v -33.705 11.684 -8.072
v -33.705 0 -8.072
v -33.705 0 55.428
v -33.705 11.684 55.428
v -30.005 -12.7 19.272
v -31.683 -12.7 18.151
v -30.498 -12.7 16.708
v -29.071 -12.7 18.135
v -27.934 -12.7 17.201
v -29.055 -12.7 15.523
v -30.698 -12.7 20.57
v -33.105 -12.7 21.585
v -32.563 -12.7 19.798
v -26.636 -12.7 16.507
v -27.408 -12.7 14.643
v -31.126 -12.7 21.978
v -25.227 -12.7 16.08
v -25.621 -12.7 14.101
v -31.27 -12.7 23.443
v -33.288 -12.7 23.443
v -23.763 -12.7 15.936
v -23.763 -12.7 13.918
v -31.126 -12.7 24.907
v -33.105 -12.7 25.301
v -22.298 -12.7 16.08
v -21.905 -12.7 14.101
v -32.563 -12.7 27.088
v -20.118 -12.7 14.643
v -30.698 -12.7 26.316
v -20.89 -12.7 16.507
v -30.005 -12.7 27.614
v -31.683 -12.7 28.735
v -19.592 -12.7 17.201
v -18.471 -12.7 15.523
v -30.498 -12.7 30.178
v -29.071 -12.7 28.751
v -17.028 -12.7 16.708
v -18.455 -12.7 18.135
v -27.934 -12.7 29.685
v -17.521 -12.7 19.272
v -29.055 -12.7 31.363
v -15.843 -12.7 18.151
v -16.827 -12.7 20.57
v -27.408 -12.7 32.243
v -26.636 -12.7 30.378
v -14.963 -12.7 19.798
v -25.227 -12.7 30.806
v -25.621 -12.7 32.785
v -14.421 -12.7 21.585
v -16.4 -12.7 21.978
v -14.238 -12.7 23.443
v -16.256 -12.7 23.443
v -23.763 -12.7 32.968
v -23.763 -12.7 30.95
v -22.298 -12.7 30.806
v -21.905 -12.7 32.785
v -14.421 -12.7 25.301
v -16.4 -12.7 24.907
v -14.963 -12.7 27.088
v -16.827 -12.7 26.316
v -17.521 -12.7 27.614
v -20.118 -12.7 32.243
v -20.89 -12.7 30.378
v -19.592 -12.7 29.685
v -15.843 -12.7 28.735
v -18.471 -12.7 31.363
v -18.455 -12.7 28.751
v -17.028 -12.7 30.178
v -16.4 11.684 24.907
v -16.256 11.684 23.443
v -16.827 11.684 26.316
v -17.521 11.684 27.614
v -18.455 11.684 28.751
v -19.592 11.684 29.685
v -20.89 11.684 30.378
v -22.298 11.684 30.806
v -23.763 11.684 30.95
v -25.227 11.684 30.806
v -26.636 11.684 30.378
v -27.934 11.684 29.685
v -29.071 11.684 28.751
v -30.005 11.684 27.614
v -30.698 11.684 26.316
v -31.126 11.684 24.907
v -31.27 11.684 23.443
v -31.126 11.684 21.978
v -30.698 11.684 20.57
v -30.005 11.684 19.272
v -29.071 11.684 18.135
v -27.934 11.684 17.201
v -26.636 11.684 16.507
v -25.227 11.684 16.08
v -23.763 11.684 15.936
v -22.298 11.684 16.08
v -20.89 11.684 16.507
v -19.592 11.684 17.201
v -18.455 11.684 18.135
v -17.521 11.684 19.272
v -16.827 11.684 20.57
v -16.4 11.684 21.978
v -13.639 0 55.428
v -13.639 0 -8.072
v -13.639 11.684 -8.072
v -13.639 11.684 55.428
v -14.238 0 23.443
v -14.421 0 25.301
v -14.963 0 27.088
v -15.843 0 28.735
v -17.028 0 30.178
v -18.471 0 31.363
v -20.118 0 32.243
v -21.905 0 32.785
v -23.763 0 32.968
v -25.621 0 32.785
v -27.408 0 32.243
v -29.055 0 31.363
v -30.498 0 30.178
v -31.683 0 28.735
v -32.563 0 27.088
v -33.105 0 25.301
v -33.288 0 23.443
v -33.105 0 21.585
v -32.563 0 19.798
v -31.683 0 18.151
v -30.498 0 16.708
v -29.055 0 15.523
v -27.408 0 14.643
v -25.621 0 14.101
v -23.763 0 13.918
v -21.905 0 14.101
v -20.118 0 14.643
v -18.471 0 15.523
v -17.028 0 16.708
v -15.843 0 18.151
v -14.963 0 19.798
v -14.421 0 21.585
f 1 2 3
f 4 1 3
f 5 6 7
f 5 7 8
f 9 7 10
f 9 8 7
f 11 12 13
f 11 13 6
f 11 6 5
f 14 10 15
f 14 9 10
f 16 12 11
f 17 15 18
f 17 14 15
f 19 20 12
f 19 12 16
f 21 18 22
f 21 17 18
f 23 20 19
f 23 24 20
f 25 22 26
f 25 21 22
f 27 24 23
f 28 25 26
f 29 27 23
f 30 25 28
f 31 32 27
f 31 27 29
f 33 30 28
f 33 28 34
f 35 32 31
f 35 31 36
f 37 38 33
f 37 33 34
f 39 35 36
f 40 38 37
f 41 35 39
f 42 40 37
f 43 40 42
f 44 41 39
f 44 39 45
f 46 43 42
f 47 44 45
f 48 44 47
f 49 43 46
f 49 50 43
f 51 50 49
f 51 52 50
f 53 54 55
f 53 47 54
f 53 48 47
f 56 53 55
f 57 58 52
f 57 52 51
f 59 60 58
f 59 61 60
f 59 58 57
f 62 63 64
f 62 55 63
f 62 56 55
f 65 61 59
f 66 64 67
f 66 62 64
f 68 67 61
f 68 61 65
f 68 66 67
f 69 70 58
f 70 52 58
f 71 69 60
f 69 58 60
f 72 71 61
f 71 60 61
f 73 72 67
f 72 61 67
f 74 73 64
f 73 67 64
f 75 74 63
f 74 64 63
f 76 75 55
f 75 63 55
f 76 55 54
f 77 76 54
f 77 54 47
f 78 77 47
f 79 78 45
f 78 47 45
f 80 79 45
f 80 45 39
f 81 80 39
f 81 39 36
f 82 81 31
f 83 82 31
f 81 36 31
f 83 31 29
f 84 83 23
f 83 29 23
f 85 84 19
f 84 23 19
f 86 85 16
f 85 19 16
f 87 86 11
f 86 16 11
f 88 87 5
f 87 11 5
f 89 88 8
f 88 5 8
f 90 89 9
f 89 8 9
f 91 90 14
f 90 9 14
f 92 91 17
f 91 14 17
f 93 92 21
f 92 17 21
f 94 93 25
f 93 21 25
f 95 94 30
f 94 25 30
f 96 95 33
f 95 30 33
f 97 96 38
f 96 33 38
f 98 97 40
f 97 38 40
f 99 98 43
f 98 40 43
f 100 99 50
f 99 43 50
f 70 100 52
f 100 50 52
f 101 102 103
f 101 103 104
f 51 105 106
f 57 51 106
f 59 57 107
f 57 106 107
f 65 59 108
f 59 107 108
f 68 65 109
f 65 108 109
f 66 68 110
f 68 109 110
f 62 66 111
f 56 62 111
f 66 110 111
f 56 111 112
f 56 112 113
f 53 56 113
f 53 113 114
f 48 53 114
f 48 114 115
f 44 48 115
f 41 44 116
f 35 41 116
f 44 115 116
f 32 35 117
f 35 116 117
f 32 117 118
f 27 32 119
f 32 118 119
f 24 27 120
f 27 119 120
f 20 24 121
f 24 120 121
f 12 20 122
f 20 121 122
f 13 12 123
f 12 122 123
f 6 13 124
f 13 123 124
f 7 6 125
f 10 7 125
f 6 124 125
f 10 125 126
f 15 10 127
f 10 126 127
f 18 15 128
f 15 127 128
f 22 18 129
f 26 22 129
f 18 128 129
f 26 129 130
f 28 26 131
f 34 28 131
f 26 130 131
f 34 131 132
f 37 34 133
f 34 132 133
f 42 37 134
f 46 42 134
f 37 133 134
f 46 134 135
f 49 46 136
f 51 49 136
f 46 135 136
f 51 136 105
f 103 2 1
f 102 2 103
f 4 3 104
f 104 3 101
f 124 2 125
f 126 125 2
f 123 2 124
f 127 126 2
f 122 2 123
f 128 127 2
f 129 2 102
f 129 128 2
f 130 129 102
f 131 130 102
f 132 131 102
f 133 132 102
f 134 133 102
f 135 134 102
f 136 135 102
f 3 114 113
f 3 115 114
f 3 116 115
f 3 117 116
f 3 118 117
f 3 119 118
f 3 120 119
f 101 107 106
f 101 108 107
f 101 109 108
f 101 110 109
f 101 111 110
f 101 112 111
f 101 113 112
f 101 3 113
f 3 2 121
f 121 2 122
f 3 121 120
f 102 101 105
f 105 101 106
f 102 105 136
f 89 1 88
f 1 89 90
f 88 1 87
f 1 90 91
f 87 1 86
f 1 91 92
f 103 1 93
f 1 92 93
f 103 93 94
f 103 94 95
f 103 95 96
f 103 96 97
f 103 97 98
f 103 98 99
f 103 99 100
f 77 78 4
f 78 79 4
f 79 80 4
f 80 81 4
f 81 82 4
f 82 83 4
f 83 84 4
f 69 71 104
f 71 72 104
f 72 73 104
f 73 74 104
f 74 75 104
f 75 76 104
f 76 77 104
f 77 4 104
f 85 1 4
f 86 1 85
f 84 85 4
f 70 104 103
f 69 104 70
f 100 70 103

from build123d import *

# Parameters (mm, degrees)
F0_R      = 9.525
F1_DEPTH  = 12.7
F2_R      = 7.506921
F3_DEPTH  = 25.4
F4_W      = 20.066
F4_H      = 63.5
F5_DEPTH  = 11.684
F5_FACE_R = 7.506921
F6_DEPTH  = 25.4


with BuildPart() as f1:
    # F0 (on Front) → F1 (new body)
    with BuildSketch(Plane.XZ):
        with Locations((-23.762971, 23.442931)):
            Circle(F0_R)
    extrude(amount=F1_DEPTH)

    # F2 (on face) → F3 (cut)
    with BuildSketch(Plane.XZ.offset(12.7)):
        with Locations((-23.762971, 23.442931)):
            Circle(F2_R)
    extrude(amount=-F3_DEPTH, mode=Mode.SUBTRACT)

    # F4 (on Front) → F5 (join)
    with BuildSketch(Plane.XZ):
        with Locations((-23.671666, 23.678257)):
            Rectangle(F4_W, F4_H)
    extrude(amount=-F5_DEPTH)

    # F5_face (on face) → F6 (cut)
    with BuildSketch(Plane(origin=(-23.762971, 0, 23.442931), x_dir=(1, 0, 0), z_dir=(0, -1, 0))):
        Circle(F5_FACE_R)
    extrude(amount=-F6_DEPTH, mode=Mode.SUBTRACT)


solid = f1.part
